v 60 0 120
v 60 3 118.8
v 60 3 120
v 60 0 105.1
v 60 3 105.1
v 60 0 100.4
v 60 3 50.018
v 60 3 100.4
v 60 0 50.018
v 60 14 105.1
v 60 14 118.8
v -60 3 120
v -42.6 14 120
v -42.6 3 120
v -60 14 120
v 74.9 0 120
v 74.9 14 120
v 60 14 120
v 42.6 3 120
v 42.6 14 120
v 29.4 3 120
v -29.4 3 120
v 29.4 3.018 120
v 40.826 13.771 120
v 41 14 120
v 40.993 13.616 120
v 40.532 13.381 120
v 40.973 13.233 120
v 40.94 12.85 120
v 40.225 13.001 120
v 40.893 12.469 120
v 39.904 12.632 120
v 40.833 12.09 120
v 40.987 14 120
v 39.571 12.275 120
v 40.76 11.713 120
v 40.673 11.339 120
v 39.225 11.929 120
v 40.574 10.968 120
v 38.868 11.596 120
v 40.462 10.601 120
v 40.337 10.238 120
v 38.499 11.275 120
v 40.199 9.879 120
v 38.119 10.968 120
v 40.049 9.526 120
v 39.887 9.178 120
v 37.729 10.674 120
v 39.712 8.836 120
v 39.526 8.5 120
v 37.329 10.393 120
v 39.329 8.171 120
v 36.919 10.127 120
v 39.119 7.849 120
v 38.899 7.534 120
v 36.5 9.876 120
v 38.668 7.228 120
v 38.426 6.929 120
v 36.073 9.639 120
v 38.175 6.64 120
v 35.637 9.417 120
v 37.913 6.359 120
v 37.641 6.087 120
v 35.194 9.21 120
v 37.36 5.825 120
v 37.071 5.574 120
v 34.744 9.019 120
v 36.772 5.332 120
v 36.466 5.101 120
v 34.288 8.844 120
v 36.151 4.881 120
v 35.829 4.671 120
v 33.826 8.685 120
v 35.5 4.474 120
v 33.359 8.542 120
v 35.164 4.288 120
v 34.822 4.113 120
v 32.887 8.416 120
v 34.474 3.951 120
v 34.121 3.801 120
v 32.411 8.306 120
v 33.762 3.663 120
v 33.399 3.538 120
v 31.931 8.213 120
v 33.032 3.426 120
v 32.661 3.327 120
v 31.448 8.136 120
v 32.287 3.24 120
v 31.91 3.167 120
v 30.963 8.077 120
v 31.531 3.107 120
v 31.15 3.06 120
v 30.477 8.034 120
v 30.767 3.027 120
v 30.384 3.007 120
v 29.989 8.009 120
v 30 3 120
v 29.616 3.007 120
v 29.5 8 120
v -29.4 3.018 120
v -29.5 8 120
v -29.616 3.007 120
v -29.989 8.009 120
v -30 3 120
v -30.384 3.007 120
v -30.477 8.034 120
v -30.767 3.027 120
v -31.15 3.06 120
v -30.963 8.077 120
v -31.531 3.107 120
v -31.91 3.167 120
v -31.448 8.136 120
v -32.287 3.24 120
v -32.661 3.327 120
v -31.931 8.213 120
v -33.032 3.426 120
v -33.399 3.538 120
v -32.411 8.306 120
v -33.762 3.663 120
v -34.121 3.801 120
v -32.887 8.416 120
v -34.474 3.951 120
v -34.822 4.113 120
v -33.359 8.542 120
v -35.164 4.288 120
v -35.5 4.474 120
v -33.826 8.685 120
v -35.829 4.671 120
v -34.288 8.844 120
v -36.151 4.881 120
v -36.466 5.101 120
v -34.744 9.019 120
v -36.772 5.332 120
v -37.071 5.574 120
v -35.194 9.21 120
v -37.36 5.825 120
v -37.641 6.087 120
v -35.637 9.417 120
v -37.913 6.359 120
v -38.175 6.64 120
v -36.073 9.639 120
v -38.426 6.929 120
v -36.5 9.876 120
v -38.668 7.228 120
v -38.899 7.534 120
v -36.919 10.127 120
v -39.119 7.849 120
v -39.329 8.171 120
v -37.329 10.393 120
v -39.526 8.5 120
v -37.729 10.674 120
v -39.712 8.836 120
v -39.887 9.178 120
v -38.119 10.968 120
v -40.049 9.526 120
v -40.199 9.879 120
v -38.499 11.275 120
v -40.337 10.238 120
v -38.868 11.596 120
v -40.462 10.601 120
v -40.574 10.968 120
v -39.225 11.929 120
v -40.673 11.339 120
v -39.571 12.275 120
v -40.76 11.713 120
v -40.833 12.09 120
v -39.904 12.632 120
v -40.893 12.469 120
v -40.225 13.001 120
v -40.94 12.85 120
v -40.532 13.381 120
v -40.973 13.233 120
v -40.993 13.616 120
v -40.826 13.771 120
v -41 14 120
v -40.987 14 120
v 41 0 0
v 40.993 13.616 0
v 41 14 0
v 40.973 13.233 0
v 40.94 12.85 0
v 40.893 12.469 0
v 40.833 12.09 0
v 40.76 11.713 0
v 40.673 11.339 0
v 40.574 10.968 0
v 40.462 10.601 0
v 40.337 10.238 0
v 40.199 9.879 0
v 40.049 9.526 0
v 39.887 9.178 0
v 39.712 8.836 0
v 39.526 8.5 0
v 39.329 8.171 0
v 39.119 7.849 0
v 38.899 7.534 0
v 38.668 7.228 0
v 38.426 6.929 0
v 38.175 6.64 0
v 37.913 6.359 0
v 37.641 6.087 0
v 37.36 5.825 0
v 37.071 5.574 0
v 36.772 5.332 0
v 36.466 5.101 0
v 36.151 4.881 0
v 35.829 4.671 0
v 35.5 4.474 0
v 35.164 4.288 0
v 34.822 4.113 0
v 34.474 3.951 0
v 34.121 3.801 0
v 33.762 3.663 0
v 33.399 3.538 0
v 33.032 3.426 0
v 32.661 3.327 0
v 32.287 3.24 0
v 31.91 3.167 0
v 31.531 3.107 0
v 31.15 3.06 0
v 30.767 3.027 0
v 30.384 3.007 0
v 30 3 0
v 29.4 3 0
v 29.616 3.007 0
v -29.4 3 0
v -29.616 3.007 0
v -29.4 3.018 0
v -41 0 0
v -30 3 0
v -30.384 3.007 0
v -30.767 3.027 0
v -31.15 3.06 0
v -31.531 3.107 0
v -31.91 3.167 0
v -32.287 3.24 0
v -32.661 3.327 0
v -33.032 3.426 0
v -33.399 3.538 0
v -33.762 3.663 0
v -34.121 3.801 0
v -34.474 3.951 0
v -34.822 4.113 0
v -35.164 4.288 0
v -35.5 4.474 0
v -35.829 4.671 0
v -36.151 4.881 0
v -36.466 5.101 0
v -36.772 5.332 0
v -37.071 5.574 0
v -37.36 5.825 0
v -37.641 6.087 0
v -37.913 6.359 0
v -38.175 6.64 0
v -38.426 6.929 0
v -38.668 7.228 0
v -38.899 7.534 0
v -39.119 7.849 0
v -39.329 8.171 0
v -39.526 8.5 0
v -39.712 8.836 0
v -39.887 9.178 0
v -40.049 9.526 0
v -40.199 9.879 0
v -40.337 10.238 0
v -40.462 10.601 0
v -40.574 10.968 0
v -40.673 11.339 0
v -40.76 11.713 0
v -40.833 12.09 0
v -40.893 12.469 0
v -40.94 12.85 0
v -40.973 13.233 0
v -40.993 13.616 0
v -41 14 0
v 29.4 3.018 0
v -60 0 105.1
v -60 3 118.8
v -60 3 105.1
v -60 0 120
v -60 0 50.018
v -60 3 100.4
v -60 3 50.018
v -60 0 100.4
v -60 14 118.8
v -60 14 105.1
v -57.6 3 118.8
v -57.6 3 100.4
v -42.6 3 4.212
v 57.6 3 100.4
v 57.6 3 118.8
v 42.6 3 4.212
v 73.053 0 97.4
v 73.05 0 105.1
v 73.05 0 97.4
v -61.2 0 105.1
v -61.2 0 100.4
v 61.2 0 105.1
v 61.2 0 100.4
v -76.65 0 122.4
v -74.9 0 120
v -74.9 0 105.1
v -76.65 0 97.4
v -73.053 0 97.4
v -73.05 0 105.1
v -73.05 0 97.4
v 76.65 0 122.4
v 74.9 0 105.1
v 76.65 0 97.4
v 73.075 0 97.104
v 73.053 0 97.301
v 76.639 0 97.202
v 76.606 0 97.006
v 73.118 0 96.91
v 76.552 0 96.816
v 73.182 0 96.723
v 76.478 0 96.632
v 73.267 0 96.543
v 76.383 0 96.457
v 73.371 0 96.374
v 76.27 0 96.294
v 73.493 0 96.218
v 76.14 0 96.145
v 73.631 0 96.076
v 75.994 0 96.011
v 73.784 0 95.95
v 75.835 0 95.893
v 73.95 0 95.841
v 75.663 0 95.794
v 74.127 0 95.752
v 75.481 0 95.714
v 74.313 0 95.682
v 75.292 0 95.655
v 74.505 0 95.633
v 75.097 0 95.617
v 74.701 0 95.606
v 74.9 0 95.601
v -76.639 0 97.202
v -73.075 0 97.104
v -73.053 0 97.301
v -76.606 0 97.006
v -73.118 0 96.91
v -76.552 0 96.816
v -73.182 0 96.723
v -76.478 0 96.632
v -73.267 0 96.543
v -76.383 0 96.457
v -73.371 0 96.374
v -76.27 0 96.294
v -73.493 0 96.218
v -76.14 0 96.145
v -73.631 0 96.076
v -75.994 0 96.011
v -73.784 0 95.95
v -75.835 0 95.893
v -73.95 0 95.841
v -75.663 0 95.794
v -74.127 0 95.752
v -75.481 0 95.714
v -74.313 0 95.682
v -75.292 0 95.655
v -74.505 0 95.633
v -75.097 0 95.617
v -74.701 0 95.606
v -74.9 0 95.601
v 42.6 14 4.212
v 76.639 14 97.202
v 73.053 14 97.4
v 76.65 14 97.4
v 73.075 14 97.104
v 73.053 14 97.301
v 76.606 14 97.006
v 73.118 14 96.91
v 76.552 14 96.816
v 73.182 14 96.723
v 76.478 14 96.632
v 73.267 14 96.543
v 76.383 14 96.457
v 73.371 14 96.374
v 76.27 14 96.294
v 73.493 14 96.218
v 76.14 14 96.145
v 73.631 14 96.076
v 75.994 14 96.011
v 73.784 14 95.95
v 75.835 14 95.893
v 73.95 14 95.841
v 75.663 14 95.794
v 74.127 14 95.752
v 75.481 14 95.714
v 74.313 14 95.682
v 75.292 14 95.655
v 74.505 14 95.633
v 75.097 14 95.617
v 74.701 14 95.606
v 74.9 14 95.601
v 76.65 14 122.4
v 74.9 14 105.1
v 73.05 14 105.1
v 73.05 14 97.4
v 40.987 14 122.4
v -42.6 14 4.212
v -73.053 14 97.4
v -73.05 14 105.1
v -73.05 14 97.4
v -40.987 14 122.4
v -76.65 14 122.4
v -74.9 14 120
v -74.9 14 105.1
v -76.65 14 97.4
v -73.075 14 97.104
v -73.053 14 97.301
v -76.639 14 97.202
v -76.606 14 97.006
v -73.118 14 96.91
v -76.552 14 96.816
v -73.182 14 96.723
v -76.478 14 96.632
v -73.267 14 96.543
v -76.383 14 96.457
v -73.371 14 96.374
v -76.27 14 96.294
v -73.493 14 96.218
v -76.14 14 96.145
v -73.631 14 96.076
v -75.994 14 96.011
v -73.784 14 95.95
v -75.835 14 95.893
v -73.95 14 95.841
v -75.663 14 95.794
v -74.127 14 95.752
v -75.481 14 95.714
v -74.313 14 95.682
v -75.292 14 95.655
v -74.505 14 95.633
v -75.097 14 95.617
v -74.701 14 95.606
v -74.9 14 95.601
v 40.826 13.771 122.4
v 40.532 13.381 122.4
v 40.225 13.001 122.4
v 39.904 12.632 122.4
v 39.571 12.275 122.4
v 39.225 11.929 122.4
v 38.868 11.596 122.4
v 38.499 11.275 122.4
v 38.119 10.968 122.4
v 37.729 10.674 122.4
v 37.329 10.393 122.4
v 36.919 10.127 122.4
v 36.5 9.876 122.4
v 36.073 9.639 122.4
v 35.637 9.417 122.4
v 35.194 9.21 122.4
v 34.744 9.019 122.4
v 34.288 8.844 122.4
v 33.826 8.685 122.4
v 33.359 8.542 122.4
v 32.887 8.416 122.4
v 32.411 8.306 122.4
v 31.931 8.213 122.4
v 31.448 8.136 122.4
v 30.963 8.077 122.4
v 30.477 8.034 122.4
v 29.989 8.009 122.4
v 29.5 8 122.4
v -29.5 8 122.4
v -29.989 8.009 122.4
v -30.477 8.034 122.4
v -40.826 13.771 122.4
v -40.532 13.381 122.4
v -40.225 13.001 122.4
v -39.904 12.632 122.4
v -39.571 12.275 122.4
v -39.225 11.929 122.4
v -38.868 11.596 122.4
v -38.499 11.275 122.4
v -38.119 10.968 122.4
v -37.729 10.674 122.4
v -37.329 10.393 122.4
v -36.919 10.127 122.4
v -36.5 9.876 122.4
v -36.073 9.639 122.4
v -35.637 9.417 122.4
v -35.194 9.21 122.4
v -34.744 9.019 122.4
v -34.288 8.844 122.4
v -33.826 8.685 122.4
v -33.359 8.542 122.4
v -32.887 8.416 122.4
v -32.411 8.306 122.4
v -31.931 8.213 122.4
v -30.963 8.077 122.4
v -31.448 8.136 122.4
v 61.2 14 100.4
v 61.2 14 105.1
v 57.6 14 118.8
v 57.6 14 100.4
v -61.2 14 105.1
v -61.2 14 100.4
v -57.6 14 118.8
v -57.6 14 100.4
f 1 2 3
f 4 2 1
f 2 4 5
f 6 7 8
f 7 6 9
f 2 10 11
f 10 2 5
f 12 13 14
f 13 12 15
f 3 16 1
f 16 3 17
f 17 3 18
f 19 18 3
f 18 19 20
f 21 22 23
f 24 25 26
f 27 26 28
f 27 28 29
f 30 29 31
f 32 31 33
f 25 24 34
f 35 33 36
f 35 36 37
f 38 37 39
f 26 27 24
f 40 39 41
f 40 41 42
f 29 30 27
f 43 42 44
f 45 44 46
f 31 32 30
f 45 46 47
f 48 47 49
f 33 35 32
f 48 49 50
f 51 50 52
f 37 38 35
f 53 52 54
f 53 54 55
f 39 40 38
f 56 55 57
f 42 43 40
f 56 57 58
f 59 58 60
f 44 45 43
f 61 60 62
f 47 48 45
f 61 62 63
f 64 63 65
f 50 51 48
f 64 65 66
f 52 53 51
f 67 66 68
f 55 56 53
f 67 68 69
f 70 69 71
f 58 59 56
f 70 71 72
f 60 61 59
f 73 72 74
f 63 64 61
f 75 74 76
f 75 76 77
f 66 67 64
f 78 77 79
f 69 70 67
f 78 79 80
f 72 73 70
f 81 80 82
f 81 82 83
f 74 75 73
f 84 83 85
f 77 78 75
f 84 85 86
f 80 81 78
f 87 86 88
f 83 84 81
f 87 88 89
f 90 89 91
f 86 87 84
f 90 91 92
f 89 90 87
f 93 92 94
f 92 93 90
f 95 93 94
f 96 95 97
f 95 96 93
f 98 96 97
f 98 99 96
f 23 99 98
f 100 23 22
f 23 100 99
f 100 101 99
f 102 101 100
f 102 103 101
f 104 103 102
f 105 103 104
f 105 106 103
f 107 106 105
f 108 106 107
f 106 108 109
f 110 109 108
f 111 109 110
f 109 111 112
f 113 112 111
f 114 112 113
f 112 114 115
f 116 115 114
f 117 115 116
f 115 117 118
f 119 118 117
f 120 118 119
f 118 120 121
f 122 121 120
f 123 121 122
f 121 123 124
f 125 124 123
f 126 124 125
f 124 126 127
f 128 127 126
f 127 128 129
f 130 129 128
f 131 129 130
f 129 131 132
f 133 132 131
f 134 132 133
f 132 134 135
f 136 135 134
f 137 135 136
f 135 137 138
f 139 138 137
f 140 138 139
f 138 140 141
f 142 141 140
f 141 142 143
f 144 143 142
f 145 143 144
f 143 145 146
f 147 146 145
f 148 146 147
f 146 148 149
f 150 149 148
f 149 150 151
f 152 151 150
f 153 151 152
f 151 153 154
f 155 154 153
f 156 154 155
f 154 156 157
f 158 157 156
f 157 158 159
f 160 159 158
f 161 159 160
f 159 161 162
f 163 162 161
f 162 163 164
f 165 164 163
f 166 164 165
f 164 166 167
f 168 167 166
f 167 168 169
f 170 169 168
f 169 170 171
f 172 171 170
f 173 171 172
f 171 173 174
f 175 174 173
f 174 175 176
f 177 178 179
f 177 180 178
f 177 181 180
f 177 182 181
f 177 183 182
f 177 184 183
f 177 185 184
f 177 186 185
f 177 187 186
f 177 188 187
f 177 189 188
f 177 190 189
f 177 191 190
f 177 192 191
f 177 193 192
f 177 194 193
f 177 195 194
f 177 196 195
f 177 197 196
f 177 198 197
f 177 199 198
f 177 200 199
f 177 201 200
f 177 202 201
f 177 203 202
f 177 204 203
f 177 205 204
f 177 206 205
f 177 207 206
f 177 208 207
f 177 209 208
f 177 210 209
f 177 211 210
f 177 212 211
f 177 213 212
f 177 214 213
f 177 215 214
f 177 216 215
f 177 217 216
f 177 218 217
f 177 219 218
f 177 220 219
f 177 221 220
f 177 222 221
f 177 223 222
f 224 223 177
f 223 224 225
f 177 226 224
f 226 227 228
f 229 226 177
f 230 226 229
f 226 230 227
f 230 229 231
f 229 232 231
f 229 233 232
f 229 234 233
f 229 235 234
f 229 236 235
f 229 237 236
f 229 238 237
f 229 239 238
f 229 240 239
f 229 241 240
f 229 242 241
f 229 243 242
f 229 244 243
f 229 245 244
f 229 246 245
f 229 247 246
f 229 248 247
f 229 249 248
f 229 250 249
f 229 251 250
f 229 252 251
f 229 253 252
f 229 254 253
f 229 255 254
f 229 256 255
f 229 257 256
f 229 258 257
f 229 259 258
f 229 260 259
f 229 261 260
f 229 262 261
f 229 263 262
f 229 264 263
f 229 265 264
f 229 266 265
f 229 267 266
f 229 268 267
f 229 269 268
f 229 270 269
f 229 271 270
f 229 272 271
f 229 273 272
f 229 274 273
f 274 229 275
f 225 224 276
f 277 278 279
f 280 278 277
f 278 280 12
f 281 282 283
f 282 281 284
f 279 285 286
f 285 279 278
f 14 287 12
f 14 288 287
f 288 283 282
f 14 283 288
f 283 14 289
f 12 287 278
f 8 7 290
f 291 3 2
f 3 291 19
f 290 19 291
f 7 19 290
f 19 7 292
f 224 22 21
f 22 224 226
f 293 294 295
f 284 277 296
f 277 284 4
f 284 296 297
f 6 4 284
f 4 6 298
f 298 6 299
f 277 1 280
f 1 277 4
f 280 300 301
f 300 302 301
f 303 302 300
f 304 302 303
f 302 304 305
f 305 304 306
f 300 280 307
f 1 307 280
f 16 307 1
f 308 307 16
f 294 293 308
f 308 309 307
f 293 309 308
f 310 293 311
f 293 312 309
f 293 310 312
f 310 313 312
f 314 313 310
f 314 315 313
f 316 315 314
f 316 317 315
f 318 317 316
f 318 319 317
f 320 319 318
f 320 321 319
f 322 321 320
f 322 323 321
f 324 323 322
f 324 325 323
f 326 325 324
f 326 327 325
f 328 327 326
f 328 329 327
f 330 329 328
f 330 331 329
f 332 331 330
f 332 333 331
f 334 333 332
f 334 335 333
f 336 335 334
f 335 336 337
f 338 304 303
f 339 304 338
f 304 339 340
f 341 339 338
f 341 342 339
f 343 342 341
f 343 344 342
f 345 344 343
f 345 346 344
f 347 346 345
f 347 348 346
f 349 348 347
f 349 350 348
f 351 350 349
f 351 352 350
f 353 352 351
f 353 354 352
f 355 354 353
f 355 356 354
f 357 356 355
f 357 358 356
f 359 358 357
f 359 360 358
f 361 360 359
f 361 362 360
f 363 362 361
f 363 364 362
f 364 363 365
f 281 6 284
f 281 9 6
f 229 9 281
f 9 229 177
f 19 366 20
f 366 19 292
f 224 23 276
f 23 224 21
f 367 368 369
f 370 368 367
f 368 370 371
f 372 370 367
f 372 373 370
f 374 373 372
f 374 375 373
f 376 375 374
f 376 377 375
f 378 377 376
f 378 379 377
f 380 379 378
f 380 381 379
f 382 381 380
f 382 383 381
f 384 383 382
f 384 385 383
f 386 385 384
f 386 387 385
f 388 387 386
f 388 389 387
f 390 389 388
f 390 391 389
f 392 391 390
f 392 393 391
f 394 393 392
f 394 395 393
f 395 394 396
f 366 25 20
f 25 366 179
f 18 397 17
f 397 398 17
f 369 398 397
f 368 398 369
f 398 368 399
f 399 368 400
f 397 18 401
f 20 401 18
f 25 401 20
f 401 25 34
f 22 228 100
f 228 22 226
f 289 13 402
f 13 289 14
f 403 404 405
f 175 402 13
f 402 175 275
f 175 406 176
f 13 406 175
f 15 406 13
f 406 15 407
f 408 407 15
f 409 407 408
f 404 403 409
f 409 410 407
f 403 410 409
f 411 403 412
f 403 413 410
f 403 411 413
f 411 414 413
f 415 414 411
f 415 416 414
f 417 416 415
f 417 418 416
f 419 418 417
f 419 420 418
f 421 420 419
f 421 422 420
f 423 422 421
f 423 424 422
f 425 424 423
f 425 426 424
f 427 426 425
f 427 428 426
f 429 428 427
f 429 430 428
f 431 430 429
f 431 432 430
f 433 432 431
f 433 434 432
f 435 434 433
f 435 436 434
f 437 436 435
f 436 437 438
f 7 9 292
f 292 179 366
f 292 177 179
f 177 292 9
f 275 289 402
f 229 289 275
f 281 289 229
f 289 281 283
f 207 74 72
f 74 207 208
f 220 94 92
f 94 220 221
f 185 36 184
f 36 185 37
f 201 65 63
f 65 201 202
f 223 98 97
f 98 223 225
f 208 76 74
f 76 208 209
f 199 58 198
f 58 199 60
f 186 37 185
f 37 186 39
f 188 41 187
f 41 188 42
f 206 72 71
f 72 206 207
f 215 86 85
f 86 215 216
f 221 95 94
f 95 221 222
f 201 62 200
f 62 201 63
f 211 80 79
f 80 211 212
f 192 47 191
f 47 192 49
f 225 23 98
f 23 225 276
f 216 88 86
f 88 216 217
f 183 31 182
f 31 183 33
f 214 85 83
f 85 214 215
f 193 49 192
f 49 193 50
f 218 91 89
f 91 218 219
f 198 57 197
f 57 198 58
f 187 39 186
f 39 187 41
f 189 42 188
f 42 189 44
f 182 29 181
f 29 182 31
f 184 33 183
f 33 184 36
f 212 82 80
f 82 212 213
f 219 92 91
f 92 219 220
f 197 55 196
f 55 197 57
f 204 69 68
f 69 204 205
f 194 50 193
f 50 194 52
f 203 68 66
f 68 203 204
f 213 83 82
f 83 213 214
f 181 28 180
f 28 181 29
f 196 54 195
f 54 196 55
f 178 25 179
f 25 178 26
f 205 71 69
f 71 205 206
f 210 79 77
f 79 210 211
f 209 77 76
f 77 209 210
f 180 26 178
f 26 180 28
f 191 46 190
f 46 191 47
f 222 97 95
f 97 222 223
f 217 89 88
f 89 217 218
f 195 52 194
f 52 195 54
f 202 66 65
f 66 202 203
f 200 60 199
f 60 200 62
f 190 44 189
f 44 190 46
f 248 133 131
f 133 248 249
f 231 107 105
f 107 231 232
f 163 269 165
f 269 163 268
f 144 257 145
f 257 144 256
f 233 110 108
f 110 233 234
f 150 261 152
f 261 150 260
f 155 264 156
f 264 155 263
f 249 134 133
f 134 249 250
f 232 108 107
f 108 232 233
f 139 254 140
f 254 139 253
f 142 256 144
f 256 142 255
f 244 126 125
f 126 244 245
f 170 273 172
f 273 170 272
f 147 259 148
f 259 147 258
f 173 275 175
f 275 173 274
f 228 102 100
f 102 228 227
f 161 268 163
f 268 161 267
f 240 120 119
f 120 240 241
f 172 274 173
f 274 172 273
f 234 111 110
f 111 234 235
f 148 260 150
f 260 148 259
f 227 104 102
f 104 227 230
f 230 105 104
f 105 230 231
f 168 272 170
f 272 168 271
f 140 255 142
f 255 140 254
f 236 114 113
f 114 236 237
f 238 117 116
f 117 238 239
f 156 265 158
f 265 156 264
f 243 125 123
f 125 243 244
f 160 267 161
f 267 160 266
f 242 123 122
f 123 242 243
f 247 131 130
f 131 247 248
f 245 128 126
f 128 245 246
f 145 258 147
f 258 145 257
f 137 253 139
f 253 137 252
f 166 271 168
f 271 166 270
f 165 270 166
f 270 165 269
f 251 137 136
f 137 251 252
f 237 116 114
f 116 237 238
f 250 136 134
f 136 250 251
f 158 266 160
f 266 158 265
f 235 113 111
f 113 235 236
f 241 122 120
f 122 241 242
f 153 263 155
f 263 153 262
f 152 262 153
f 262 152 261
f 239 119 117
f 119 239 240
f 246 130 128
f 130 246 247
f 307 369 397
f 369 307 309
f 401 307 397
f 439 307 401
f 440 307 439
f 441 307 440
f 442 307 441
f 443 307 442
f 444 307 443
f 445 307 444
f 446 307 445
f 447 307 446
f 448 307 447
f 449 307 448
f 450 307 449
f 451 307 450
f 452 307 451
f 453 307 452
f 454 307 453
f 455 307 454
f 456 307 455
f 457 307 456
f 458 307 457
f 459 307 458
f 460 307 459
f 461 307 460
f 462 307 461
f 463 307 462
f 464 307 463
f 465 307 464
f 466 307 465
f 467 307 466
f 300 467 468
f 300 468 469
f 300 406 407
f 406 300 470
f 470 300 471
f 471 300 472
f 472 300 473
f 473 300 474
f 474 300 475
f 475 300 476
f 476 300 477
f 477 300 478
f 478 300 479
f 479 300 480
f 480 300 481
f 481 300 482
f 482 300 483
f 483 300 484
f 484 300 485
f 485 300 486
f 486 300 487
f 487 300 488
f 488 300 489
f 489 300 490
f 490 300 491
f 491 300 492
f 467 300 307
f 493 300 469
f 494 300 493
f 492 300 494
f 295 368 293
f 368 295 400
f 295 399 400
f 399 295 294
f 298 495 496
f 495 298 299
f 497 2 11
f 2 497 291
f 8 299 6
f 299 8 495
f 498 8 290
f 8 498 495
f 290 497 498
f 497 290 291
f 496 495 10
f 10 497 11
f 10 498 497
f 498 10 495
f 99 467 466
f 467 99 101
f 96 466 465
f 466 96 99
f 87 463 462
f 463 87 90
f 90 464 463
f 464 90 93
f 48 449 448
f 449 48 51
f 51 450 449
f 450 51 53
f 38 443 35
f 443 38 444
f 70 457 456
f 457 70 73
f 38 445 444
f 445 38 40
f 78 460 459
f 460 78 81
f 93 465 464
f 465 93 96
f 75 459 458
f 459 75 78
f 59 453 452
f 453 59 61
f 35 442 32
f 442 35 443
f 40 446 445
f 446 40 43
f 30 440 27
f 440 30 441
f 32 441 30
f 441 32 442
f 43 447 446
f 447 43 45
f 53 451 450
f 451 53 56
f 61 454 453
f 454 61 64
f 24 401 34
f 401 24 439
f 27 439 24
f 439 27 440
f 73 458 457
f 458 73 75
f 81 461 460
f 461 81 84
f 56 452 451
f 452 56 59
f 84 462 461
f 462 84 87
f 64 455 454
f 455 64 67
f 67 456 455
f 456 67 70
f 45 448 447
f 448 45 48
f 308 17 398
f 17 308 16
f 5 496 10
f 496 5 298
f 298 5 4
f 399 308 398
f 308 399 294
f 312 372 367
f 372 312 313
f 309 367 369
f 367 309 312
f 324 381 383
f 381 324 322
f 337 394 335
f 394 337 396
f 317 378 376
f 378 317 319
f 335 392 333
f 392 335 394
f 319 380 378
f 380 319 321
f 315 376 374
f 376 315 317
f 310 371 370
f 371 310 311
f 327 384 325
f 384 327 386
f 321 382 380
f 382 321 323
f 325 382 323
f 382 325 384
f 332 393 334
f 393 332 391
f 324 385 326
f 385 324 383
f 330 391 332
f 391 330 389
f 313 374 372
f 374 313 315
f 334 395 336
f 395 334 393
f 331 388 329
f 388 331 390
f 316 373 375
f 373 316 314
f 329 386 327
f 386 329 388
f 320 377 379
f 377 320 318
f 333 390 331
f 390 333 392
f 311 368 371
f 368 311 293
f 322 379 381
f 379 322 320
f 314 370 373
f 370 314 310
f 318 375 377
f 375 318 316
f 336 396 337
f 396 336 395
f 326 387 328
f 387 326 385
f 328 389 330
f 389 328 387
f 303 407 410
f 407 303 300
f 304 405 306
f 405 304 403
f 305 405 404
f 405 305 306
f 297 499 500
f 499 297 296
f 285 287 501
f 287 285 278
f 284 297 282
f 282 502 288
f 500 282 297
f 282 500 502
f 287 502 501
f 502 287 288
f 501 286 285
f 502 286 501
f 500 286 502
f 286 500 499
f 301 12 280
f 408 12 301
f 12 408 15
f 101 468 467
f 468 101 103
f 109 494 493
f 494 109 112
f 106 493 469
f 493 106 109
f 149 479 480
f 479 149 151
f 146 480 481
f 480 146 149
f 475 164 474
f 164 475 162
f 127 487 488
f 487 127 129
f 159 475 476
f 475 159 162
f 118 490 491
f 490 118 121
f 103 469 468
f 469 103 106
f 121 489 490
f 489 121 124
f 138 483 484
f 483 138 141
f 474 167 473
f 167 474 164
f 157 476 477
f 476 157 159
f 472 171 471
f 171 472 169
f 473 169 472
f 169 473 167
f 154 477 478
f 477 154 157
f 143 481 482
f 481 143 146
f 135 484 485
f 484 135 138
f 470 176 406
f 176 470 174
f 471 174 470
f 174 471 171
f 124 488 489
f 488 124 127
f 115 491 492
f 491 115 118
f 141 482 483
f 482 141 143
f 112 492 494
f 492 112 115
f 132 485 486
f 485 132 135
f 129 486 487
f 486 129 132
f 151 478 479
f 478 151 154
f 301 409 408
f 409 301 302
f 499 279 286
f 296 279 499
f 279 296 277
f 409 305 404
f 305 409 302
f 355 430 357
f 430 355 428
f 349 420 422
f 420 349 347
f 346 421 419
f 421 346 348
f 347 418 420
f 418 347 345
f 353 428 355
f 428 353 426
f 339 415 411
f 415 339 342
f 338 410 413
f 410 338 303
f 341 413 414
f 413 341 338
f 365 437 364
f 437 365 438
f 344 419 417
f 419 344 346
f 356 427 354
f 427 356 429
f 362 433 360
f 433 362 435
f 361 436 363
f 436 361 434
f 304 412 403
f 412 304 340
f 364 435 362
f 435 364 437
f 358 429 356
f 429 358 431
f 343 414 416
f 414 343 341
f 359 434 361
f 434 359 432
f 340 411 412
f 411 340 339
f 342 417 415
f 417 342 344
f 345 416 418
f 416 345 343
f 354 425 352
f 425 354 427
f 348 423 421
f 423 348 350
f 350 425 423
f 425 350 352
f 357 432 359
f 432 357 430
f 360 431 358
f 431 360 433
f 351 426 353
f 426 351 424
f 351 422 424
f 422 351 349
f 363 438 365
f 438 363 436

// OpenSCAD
// Optimised for 0.6mm nozzle

$fa=2;
$fs=0.2;

// Parameters
height_div = 120;
widthA_div = 120;
widthB_div = 82;
thickness_div = 3;

width_rib = 148.5;
depth_rib = 14;
thickness_rib = 2.4;
offset_rib = 5;

thickness_catch = 1.2;

width_rail = 14.3;
fudge = 0.6;

// Construction
difference() {
    union() {
        difference() {
            union() {
                // Divider
                translate([-widthA_div/2,0,0])
                cube([widthA_div, thickness_div, height_div]);
                
                // Divider rib
                translate([widthB_div/2-(depth_rib-thickness_rib),0,0])
                cube([13.2, depth_rib, height_div]);
                
                translate([-(widthB_div/2-(depth_rib-thickness_rib))-13.2,0,0])
                cube([13.2, depth_rib, height_div]);
            }
            
            // Diagonals
            translate([widthB_div/2,-1,0])
            rotate([0,20.8,0])
            cube([20, depth_rib+2, 70]);
            
            translate([-widthB_div/2,-1,0])
            rotate([0,-20.8,0])
            translate([-20,0,0])
            cube([20, depth_rib+2, 70]);
        }
    }
    
    union() {    
        // Side rib cutout
        translate([widthB_div/2-(depth_rib-thickness_div), depth_rib,-1])
        cylinder(h=height_div+2, r=(depth_rib-thickness_div));
    
        translate([-(widthB_div/2-(depth_rib-thickness_div)), depth_rib,-1])
        cylinder(h=height_div+2, r=(depth_rib-thickness_div));      
    }
}

module rail() {
    translate([widthA_div/2,-5, height_div-width_rail-fudge])
    cube([width_rail+fudge, 50, width_rail+fudge]); // including fudge             
}

module clip() {
    difference() {
        union() {
            // Side clip outer
            translate([width_rib/2-thickness_catch,0, height_div+thickness_rib-25])
            cube([thickness_rib+thickness_catch,depth_rib,25]);
            
            // Side clip inner
            translate([widthA_div/2-thickness_catch*2,0, height_div-18.4-1.2])
            cube([thickness_rib+thickness_catch,depth_rib,18.4]);
            
            // Top rib
            translate([0,0,height_div])
            cube([width_rib/2, depth_rib, thickness_rib]);
        }
        
        union() {
            // Top rib cutout
            inset = (widthB_div-depth_rib-9);
       
            translate([-1, thickness_div+offset_rib, height_div-1])
            cube([inset/2+1, depth_rib, thickness_rib*2]);
           
            translate([inset/2, depth_rib+offset_rib+3, 0])
            cylinder(h=height_div+thickness_rib+2, r=depth_rib);
    
            rail();
        }
    } 
    
    // Clip round end
    translate([width_rib/2+thickness_catch/2, 0, height_div+thickness_rib-25])
    rotate([-90,0,0])
    cylinder(h=depth_rib, r=(thickness_rib+thickness_catch)/2);
}

clip();
mirror(v=[1,0,0]) {clip();}
